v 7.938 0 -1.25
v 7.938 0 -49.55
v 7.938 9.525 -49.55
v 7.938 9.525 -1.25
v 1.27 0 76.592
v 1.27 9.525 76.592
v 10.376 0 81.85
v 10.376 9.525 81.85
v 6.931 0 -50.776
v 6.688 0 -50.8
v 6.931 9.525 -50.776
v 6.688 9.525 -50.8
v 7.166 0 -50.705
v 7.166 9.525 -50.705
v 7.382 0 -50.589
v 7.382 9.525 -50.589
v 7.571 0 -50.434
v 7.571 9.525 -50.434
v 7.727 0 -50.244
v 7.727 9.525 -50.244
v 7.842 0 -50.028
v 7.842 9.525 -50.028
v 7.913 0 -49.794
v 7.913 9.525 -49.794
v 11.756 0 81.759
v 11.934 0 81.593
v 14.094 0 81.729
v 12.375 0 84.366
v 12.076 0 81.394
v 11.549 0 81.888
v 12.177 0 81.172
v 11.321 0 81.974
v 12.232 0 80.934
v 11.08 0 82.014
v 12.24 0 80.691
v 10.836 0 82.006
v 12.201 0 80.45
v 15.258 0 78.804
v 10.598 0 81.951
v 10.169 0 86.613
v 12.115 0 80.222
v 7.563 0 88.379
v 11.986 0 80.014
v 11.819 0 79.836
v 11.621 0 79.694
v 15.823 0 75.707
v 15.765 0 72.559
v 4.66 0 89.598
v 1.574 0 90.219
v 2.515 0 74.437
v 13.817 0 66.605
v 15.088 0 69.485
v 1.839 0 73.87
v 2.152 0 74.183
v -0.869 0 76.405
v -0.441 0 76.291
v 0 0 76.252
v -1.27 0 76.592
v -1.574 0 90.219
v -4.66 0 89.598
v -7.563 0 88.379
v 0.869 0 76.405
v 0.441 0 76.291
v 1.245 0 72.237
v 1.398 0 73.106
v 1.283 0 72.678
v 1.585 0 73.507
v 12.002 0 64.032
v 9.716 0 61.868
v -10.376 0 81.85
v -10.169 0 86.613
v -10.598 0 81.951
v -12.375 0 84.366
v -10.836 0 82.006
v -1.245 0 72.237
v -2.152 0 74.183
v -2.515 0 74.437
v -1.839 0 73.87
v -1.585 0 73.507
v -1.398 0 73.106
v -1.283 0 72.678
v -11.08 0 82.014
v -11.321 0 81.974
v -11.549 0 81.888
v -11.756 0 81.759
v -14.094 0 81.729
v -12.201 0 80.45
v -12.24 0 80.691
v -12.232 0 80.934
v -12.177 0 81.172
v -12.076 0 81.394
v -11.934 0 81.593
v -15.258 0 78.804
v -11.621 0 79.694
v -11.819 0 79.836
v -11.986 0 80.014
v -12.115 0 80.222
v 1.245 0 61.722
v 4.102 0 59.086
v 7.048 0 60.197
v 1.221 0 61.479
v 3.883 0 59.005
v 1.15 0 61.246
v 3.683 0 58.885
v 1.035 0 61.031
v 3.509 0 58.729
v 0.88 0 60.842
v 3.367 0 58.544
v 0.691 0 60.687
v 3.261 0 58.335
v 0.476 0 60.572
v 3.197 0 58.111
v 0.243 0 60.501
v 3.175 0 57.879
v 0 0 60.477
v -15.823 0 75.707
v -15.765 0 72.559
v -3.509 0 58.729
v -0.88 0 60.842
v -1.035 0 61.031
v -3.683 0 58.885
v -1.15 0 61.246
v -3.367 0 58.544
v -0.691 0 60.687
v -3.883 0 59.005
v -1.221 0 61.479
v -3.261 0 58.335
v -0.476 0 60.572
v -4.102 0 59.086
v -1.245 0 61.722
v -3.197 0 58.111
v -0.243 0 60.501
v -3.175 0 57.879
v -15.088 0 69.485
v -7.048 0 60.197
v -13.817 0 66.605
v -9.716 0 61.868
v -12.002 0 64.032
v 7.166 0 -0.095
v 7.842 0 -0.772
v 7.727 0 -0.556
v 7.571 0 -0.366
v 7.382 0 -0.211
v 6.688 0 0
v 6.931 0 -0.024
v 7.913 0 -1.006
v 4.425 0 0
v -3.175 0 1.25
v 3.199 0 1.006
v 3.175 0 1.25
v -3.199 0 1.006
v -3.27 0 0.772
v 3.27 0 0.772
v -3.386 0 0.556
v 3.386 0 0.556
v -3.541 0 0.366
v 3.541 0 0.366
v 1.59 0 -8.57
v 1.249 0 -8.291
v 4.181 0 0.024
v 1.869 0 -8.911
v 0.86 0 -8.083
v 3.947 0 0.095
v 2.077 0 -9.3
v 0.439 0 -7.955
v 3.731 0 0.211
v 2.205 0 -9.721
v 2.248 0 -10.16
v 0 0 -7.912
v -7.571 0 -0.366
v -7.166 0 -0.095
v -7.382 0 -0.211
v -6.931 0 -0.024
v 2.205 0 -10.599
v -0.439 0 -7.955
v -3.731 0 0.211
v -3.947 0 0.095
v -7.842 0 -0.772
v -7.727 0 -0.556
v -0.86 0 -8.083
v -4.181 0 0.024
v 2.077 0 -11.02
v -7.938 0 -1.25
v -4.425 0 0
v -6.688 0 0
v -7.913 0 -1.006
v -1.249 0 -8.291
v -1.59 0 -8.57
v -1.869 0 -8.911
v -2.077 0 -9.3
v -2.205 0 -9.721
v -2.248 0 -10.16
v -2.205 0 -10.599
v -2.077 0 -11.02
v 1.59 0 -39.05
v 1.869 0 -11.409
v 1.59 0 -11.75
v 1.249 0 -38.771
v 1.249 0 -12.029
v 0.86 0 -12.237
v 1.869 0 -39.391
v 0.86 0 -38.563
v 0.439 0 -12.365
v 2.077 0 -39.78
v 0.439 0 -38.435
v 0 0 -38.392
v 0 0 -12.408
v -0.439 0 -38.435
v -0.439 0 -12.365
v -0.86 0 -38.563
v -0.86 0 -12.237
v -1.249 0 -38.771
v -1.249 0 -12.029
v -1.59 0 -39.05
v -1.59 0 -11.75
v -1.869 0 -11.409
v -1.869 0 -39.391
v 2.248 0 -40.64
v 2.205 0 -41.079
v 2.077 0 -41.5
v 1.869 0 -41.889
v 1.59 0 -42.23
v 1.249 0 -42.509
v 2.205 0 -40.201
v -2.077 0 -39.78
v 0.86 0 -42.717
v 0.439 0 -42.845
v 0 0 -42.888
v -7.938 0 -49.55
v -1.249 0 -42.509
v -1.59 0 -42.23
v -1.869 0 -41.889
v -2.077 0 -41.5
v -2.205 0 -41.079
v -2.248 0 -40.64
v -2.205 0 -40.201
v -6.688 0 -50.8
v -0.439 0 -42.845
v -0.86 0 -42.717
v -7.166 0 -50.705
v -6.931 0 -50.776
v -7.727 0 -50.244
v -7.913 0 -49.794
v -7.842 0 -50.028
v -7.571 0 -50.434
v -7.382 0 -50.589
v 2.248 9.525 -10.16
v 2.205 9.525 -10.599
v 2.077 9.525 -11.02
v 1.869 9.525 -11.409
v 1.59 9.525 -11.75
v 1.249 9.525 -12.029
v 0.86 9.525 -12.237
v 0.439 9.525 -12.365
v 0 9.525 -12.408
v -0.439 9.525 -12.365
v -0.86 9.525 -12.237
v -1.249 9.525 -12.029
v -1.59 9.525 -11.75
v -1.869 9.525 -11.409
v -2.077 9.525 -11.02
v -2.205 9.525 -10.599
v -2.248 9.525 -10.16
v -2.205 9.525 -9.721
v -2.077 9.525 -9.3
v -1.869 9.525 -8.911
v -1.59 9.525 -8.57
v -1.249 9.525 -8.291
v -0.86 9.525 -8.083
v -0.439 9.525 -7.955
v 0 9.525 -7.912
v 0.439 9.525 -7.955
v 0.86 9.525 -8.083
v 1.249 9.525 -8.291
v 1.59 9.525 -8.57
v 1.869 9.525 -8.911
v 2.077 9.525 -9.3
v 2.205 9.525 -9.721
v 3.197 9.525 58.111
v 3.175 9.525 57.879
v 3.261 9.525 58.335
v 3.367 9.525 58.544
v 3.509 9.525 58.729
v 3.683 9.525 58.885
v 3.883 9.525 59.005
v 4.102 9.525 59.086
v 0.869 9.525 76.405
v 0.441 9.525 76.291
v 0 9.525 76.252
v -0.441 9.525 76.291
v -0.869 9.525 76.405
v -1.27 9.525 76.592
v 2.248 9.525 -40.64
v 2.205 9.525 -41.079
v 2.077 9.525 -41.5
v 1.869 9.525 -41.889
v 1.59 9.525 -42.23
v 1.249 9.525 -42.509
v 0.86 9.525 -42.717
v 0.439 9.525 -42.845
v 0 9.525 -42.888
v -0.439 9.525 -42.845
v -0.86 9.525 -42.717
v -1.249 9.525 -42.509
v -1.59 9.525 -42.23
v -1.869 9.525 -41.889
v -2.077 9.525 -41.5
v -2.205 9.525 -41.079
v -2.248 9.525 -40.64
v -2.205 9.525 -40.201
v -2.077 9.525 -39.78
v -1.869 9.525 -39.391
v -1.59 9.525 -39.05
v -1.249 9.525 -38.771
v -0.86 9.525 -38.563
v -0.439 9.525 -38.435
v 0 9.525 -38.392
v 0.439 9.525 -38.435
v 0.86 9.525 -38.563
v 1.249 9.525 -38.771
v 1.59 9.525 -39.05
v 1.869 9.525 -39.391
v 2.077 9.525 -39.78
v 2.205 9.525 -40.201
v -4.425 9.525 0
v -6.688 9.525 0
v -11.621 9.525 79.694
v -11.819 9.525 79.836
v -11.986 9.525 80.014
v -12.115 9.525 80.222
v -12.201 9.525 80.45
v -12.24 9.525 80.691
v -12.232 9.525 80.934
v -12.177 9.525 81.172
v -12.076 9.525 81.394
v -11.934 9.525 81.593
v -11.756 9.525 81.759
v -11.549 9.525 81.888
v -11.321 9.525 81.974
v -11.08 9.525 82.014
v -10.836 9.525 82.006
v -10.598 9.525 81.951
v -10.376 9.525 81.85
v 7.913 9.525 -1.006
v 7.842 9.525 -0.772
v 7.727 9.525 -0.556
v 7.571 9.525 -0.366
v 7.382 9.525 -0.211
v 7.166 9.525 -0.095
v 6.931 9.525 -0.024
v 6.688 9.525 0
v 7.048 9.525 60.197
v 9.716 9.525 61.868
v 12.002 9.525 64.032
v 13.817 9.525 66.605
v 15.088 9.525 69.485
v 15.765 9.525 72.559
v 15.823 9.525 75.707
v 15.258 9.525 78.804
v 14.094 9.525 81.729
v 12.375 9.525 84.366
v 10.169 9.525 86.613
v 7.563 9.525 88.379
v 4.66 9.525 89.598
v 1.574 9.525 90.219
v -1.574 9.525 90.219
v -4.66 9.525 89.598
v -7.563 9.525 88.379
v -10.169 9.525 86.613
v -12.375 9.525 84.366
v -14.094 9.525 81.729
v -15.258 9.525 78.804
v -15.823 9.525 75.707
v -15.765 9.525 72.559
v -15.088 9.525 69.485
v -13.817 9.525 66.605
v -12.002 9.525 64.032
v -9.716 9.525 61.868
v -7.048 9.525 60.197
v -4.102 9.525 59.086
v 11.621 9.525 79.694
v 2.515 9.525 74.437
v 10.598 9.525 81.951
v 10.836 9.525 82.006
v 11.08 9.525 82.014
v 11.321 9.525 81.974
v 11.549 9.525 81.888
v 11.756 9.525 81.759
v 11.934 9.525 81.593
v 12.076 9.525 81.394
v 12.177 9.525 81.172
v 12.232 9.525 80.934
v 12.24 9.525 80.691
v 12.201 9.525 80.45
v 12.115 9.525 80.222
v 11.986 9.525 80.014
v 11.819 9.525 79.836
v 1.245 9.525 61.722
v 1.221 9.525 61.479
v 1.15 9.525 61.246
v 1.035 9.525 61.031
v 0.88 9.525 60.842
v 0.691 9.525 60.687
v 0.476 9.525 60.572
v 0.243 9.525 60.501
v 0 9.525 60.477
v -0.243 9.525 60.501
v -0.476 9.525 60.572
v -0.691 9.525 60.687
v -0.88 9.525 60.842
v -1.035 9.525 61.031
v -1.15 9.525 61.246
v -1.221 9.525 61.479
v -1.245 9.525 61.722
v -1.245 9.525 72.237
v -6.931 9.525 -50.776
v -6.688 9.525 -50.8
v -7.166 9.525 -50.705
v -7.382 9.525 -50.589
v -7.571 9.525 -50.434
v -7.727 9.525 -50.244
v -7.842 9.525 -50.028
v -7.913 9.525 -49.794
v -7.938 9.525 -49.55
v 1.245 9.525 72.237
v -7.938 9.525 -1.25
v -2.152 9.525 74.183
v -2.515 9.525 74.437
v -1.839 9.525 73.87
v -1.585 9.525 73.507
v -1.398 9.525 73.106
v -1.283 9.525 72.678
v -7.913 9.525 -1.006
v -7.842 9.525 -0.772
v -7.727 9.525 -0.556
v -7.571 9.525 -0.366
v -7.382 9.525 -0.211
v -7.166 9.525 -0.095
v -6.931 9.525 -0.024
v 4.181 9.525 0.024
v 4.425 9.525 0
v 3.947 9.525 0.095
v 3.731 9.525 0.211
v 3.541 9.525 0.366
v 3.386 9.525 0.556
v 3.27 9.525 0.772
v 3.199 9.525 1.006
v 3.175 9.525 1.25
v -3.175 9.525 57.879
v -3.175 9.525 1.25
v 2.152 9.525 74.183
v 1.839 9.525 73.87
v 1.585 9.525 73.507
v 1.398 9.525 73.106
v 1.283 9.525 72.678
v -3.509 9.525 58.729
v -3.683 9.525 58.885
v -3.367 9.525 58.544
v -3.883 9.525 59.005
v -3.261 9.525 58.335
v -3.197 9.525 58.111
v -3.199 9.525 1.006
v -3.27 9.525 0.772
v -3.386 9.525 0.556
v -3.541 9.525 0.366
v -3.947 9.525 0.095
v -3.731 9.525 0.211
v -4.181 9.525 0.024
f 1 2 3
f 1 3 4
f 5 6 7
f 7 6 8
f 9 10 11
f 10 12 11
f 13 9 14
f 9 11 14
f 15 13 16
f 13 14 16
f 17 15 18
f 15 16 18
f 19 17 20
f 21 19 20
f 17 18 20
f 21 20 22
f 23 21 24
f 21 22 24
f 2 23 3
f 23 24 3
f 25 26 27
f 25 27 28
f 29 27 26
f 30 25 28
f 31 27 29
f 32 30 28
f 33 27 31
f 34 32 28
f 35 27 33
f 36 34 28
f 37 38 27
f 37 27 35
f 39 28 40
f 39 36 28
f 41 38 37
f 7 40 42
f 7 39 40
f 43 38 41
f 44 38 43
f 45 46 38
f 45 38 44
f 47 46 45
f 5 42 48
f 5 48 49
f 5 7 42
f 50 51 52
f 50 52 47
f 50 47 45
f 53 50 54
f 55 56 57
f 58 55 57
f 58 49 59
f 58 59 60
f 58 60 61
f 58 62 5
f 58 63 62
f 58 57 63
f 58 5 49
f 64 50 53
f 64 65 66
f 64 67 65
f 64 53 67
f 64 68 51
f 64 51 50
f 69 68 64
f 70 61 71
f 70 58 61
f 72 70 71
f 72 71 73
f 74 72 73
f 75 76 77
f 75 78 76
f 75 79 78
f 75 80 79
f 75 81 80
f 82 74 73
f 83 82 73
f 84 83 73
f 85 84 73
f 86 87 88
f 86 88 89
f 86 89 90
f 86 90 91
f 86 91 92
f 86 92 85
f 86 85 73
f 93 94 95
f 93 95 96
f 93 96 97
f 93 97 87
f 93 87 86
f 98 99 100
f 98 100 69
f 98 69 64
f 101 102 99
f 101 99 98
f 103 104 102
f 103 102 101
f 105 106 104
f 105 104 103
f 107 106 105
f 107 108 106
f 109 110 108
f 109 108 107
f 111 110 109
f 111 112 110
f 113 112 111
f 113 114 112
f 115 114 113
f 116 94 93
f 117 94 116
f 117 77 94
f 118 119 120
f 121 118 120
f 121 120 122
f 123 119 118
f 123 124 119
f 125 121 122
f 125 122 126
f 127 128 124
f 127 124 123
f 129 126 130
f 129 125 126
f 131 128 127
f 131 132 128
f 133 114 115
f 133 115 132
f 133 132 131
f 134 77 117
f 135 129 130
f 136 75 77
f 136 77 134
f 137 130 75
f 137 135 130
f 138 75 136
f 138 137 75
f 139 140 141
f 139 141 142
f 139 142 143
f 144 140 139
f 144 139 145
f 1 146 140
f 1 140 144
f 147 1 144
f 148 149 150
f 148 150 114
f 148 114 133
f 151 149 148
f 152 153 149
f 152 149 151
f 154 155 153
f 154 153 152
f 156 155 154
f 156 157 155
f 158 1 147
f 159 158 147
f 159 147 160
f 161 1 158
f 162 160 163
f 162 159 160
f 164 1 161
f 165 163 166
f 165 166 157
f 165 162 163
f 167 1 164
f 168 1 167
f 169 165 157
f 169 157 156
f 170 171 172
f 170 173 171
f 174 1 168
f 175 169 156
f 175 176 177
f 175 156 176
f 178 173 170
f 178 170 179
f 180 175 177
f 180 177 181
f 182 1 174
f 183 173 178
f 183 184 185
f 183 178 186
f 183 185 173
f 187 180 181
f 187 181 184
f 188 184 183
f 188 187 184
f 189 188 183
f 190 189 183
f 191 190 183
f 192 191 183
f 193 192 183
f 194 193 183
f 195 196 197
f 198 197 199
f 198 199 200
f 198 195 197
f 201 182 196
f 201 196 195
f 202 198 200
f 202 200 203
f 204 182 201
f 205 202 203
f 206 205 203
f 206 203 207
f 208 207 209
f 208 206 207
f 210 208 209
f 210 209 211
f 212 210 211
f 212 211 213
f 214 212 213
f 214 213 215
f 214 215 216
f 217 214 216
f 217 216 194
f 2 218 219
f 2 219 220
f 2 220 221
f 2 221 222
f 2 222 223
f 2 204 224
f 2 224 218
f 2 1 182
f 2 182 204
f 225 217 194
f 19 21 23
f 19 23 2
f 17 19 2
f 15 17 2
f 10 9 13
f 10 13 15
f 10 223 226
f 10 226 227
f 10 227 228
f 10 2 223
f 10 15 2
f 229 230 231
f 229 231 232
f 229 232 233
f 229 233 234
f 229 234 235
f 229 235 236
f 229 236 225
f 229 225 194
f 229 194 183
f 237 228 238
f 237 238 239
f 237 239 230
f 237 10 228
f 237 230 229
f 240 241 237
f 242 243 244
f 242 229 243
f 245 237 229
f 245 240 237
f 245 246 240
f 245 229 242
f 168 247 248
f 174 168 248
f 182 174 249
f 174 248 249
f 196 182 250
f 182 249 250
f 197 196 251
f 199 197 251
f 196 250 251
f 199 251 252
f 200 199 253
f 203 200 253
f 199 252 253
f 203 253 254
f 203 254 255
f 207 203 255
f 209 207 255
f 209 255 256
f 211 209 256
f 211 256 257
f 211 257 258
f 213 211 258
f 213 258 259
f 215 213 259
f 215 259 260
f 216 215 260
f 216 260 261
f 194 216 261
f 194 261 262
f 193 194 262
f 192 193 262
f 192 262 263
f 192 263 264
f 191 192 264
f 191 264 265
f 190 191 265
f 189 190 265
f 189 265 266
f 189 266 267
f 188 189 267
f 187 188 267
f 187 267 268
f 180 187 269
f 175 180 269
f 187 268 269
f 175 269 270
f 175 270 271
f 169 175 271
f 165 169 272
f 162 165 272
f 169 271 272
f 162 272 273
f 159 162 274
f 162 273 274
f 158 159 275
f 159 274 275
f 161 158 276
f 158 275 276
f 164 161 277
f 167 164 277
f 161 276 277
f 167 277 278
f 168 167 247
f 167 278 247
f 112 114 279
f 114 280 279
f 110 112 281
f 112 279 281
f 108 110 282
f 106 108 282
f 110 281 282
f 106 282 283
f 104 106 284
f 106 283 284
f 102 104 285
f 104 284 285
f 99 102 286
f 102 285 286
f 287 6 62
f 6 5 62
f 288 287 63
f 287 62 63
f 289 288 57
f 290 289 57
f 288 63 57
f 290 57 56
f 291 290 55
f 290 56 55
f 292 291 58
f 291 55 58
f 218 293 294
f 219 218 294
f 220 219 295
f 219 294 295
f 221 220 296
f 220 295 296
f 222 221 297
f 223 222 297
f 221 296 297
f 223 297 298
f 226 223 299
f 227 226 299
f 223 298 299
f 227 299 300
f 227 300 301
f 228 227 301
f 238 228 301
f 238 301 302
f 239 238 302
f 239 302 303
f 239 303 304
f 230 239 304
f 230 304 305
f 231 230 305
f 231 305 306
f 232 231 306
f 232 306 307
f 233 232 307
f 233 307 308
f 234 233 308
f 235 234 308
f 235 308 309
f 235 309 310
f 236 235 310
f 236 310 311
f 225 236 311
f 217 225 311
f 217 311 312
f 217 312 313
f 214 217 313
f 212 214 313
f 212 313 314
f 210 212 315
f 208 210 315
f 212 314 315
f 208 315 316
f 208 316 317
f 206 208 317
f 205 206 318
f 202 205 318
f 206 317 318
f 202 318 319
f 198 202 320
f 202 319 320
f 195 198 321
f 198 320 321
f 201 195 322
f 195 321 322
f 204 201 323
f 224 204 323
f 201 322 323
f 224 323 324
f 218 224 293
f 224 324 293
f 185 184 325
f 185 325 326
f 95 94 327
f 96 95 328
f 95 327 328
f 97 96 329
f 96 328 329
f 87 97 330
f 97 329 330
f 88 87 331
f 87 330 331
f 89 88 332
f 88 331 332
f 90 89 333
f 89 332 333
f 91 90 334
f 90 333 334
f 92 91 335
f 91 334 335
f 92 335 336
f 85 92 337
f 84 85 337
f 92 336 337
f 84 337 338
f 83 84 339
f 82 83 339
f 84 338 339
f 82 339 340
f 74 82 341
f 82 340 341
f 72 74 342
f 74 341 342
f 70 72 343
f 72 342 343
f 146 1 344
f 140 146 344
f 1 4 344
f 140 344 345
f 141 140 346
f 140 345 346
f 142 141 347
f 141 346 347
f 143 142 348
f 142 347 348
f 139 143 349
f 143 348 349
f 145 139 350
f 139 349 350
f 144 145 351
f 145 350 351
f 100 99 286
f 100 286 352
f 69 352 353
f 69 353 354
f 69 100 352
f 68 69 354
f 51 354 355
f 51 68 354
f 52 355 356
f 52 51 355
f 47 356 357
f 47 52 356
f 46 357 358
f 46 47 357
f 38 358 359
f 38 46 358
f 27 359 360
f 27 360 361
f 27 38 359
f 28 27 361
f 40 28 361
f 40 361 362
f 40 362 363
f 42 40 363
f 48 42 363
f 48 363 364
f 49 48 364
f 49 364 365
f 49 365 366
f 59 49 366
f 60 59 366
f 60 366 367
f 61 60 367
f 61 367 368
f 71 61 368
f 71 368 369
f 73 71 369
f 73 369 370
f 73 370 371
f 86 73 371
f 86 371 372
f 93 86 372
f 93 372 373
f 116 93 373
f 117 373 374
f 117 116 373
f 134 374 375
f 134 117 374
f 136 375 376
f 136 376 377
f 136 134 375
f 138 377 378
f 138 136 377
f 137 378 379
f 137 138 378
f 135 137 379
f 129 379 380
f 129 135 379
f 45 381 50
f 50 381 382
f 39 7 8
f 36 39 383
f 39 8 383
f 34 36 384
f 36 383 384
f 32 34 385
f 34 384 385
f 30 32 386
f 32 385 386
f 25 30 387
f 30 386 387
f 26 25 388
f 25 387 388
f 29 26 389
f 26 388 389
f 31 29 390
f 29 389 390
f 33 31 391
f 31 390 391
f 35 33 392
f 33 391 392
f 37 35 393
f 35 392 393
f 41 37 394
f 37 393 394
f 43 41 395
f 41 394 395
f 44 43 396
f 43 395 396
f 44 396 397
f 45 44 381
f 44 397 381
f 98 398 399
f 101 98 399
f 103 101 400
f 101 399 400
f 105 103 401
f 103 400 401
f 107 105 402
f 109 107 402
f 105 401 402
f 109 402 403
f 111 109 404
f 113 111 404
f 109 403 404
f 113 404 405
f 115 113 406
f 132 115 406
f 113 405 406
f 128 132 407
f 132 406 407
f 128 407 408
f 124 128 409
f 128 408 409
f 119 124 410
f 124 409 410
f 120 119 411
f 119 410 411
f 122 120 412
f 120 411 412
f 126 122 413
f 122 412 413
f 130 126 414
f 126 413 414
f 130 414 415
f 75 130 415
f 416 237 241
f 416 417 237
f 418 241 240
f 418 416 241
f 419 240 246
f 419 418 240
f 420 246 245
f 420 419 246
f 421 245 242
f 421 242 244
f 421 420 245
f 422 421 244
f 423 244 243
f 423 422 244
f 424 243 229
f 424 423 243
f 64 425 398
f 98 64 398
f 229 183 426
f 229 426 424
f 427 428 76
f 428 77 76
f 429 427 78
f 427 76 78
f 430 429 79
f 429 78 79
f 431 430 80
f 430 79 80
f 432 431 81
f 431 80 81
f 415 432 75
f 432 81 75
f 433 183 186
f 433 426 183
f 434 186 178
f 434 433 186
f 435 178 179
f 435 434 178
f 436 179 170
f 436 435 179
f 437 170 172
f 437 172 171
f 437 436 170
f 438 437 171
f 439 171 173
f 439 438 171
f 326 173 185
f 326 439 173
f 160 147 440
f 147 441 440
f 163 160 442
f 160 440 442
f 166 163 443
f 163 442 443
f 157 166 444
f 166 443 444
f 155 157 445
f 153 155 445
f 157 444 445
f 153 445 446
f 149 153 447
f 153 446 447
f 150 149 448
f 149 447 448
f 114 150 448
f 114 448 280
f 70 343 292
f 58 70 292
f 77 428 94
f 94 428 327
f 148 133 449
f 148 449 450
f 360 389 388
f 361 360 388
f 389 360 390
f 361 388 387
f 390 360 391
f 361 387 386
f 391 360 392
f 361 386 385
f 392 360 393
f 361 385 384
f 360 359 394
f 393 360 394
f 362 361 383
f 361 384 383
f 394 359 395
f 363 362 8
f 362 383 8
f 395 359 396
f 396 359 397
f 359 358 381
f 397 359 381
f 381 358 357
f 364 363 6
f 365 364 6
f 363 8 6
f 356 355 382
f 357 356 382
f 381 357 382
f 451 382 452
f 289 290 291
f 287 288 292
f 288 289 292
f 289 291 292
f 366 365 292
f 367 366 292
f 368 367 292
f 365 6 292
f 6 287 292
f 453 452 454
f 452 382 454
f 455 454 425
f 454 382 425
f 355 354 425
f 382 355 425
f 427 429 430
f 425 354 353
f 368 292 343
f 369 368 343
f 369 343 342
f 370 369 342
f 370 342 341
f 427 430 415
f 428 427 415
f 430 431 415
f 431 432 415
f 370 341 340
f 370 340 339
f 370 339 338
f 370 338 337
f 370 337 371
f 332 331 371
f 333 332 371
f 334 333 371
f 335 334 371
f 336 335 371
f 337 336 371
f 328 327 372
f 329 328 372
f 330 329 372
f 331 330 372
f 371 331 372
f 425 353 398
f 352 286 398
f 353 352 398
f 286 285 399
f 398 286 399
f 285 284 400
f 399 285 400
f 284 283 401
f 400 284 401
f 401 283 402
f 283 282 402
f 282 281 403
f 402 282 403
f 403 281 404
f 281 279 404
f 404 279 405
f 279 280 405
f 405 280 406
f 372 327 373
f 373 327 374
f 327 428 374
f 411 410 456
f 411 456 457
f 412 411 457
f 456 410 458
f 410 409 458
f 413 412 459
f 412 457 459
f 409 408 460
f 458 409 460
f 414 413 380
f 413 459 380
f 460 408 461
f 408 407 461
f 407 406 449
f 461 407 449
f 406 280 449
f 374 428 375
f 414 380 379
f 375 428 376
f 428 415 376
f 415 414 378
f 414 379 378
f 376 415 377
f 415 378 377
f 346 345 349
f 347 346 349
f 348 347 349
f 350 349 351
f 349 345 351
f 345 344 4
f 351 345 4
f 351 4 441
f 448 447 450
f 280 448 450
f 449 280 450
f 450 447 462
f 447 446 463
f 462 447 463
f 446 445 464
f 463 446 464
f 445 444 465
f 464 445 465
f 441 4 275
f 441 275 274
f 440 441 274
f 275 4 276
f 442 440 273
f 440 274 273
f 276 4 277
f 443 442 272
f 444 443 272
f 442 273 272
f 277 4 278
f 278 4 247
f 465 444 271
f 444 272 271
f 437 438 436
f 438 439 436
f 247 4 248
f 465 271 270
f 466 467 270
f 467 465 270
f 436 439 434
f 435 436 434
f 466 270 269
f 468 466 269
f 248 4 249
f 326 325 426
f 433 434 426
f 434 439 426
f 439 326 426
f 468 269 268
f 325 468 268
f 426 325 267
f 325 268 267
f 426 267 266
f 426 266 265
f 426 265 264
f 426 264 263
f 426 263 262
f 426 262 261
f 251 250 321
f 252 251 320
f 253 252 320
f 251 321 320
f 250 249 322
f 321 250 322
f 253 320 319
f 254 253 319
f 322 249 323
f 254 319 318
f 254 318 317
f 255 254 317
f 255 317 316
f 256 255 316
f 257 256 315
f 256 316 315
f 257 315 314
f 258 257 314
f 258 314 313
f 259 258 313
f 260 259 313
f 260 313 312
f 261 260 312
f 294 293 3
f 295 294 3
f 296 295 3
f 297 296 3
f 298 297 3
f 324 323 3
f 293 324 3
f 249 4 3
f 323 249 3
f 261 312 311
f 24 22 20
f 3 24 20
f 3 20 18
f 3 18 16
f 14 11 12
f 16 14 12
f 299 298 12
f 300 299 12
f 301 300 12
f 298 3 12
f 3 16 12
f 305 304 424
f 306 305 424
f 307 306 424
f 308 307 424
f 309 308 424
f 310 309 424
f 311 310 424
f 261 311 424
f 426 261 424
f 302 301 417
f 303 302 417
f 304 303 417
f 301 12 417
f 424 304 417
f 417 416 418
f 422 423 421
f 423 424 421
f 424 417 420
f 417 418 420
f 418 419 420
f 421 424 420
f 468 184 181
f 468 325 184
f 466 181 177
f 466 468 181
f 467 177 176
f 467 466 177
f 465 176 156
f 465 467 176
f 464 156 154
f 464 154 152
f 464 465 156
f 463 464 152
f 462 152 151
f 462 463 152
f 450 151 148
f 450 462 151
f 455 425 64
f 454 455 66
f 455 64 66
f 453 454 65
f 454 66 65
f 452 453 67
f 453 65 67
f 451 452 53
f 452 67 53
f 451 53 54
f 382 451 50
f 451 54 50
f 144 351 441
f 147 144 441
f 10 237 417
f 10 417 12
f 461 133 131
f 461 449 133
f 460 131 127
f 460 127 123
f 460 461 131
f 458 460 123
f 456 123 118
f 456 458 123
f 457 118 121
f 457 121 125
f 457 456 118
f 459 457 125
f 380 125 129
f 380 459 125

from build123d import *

# Parameters (mm, degrees)
BOSS_EXTRUDE1_DEPTH = 9.525
SKETCH2_R           = 2.2479
CUT_EXTRUDE1_DEPTH  = 10.525
CUT_EXTRUDE2_DEPTH  = 10.525
FILLET1_R           = 1.25
FILLET2_R           = 2.54


with BuildPart() as part:
    # Sketch1 → Boss-Extrude1 (new body)
    with BuildSketch(Plane(origin=(0, 0, 0), x_dir=(1, 0, 0), z_dir=(0, 1, 0))):
        with BuildLine():
            Line((-7.9375, 50.8), (7.9375, 50.8))
            Line((7.9375, 50.8), (7.9375, 0))
            Line((7.9375, 0), (3.175, 0))
            Line((3.175, 0), (3.175, -58.867740133))
            ThreePointArc((3.175, -58.867740133), (0, -90.297), (-3.175, -58.867740133))
            Line((-3.175, -58.867740133), (-3.175, 0))
            Line((-3.175, 0), (-7.9375, 0))
            Line((-7.9375, 0), (-7.9375, 50.8))
        make_face()
    extrude(amount=BOSS_EXTRUDE1_DEPTH)

    # Sketch2 → Cut-Extrude1 (cut, through all)
    with BuildSketch(Plane(origin=(0, 9.525, 0), x_dir=(1, 0, 0), z_dir=(0, 1, 0))):
        with Locations((0, 40.64)):
            Circle(SKETCH2_R)
        with Locations((0, 10.16)):
            Circle(SKETCH2_R)
    extrude(amount=-CUT_EXTRUDE1_DEPTH, mode=Mode.SUBTRACT)

    # Sketch3 → Cut-Extrude2 (cut, through all)
    with BuildSketch(Plane(origin=(0, 9.525, 0), x_dir=(1, 0, 0), z_dir=(0, 1, 0))):
        with BuildLine():
            Line((0, -75.85914029), (10.376222628, -81.849855218))
            ThreePointArc((10.376222628, -81.849855218), (12.076377846, -81.3943), (11.620822628, -79.694144782))
            Line((11.620822628, -79.694144782), (1.2446, -73.703429855))
            Line((1.2446, -73.703429855), (1.2446, -61.722))
            ThreePointArc((1.2446, -61.722), (0, -60.4774), (-1.2446, -61.722))
            Line((-1.2446, -61.722), (-1.2446, -73.703429855))
            Line((-1.2446, -73.703429855), (-11.620822628, -79.694144782))
            ThreePointArc((-11.620822628, -79.694144782), (-12.076377846, -81.3943), (-10.376222628, -81.849855218))
            Line((-10.376222628, -81.849855218), (0, -75.85914029))
        make_face()
    extrude(amount=-CUT_EXTRUDE2_DEPTH, mode=Mode.SUBTRACT)

    # Fillet1
    fillet1_edges = [part.edges().sort_by_distance(p)[0] for p in [
        (-7.9375, 4.7625, -50.8),
        (7.9375, 4.7625, -50.8),
        (7.9375, 4.7625, 0),
        (3.175, 4.7625, 0),
        (3.175, 4.7625, 58.867740133),
        (-3.175, 4.7625, 58.867740133),
        (-3.175, 4.7625, 0),
        (-7.9375, 4.7625, 0),
    ]]
    fillet(fillet1_edges, radius=FILLET1_R)

    # Fillet2
    fillet2_edges = [part.edges().sort_by_distance(p)[0] for p in [
        (1.2446, 4.7625, 73.703429855),
        (0, 4.7625, 75.85914029),
        (-1.2446, 4.7625, 73.703429855),
    ]]
    fillet(fillet2_edges, radius=FILLET2_R)


solid = part.part
